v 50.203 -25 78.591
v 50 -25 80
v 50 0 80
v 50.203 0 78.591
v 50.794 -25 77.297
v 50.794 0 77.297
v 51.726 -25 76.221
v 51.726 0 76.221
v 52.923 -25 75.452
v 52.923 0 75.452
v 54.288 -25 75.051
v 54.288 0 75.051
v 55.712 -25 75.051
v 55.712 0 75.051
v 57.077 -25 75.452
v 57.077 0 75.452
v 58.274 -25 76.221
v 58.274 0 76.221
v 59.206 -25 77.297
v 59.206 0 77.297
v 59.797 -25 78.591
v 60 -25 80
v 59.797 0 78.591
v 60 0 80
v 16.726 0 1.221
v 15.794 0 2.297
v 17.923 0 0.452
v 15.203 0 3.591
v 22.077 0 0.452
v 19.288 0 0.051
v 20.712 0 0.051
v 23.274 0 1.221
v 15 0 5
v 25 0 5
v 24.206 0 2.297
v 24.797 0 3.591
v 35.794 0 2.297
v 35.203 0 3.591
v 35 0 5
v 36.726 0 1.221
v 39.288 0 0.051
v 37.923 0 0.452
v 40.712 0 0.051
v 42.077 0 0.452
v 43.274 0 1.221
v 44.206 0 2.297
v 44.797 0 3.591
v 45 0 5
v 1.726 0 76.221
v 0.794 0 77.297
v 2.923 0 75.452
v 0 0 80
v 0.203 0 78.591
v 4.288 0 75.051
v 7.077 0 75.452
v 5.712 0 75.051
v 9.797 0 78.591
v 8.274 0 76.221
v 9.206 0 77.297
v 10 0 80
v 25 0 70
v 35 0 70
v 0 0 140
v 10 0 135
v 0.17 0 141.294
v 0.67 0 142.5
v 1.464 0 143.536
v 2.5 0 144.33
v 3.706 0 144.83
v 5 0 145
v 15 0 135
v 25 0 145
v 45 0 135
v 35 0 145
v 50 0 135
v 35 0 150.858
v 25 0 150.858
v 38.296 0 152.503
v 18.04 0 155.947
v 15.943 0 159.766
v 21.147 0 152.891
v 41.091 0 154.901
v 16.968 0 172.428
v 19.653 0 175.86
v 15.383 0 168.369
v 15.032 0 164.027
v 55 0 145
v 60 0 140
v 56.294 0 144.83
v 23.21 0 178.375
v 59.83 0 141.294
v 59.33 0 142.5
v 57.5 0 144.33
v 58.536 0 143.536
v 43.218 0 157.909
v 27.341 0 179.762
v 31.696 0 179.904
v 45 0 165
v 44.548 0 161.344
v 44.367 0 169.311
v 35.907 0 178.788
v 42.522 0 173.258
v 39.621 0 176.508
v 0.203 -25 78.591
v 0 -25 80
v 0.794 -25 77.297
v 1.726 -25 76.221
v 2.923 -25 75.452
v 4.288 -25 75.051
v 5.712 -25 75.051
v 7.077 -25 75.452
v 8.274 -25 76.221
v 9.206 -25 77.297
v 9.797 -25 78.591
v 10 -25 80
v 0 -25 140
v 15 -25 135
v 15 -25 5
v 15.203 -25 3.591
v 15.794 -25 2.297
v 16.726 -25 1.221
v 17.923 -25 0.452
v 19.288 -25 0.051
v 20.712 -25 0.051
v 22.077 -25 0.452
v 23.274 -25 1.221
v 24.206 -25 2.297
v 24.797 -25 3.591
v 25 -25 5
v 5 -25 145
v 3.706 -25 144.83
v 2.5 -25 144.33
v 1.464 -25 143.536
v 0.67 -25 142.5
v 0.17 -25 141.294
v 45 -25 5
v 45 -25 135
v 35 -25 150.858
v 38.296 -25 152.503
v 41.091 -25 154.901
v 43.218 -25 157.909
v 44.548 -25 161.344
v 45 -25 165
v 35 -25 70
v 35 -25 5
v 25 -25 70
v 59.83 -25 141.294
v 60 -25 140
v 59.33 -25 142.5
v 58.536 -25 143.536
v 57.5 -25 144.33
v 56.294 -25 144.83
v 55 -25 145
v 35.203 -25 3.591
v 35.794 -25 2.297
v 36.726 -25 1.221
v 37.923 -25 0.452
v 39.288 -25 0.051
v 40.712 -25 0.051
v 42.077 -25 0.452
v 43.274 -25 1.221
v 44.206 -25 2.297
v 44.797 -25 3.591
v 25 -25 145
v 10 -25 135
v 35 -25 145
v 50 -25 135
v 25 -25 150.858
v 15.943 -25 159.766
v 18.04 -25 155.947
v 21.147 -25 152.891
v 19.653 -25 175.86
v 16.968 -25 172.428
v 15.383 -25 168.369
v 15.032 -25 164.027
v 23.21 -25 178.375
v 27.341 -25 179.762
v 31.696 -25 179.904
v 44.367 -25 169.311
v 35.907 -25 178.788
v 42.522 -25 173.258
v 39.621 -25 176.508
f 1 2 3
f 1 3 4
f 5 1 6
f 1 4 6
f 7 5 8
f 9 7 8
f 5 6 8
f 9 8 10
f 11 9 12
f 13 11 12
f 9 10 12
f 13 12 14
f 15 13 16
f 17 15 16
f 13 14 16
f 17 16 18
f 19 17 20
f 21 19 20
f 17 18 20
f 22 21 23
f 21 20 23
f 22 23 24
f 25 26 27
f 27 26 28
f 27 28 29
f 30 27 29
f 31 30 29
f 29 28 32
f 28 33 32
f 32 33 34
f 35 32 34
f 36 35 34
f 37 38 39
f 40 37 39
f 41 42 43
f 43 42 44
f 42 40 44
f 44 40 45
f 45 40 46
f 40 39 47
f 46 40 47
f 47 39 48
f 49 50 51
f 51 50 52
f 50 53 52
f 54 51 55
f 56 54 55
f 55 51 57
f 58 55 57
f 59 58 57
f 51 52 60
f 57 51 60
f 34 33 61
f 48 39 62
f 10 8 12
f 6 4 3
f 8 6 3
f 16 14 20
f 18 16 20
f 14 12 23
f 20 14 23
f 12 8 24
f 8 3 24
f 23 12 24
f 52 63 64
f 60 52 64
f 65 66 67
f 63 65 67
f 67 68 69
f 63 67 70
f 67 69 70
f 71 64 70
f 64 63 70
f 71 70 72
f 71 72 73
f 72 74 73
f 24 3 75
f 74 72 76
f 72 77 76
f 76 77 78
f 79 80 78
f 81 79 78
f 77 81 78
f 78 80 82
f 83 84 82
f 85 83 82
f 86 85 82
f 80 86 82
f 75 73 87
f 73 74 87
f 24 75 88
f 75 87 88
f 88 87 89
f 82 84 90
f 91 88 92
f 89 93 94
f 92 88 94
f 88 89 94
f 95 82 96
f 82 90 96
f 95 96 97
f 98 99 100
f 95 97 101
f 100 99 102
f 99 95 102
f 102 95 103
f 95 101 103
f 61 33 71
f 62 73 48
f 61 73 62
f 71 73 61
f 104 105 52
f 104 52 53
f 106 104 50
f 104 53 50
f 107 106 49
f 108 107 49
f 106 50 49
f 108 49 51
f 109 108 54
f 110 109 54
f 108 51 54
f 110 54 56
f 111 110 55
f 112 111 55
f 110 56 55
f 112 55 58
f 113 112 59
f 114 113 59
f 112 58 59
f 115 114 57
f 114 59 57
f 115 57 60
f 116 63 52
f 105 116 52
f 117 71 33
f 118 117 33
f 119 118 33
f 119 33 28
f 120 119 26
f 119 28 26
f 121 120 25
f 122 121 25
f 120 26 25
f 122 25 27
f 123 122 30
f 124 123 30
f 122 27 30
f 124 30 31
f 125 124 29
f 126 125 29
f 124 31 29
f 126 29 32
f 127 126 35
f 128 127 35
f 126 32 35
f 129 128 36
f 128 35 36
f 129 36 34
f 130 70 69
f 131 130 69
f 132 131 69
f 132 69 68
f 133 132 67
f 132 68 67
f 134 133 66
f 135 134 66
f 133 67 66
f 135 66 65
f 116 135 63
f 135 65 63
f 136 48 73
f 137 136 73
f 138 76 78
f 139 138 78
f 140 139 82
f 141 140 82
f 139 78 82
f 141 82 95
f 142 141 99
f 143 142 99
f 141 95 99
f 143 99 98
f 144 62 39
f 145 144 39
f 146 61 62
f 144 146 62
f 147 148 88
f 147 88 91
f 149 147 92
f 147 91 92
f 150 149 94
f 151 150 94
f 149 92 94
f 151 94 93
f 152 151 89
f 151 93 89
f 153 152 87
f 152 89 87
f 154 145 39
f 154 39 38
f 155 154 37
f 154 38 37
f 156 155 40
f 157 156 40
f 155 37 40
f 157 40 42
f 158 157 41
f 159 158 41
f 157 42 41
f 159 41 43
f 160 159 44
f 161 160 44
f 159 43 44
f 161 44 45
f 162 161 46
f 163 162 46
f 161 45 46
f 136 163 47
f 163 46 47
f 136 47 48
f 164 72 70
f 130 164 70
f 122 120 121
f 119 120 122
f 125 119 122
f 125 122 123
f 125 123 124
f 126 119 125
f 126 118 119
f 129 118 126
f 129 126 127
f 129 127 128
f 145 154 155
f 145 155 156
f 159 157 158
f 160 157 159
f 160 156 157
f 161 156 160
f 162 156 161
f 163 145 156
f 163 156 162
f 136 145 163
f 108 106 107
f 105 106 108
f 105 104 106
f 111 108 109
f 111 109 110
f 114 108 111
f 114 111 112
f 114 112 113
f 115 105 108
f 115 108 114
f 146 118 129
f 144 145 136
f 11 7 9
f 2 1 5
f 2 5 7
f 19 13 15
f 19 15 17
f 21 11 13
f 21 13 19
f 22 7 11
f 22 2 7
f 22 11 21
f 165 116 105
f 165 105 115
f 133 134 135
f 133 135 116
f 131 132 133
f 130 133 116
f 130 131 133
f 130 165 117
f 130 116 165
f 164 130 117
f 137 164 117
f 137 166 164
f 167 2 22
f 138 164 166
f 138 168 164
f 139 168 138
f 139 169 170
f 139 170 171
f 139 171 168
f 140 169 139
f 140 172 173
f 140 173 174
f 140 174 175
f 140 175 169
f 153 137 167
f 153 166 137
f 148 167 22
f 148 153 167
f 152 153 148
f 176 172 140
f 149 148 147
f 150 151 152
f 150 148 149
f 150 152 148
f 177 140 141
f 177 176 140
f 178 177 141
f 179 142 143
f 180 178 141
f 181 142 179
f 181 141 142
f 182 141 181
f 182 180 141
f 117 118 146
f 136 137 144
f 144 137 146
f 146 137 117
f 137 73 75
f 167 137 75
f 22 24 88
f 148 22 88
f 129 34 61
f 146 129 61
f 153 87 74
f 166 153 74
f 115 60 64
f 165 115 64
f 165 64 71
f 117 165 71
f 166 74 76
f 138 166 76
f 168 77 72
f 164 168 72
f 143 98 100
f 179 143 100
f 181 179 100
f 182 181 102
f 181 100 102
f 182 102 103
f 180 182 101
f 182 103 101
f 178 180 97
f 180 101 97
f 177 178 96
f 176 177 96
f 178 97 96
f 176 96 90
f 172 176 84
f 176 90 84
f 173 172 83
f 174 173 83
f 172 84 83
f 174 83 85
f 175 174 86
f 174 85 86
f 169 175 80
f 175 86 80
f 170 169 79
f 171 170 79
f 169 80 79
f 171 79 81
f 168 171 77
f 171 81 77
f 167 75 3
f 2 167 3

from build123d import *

# Parameters (mm, degrees)
F0_W     = 5
F0_H     = 5
F1_DEPTH = 25


with BuildPart() as f1:
    # F0 (on Front) → F1 (new body)
    with BuildSketch(Plane.XZ):
        with BuildLine():
            ThreePointArc((35, 150.8578643763), (42.2474487139, 156.3397459622), (45, 165))
            ThreePointArc((45, 165), (21.3397459622, 177.2474487139), (25, 150.8578643763))
            ThreePointArc((25, 150.8578643763), (27.4634703191, 150.2160216052), (30, 150))
            ThreePointArc((30, 150), (32.5365296809, 150.2160216052), (35, 150.8578643763))
        make_face()
        with BuildLine():
            ThreePointArc((30, 150), (27.4634703191, 150.2160216052), (25, 150.8578643763))
            Line((25, 150.8578643763), (25, 145))
            Line((25, 145), (30, 145))
            Line((30, 145), (30, 150))
        make_face()
        with BuildLine():
            Line((35, 145), (35, 150.8578643763))
            ThreePointArc((35, 150.8578643763), (32.5365296809, 150.2160216052), (30, 150))
            Line((30, 150), (30, 145))
            Line((30, 145), (35, 145))
        make_face()
        with BuildLine():
            Line((25, 140), (25, 145))
            Line((25, 145), (5, 145))
            ThreePointArc((5, 145), (8.5355339059, 143.5355339059), (10, 140))
            Line((10, 140), (25, 140))
        make_face()
        with BuildLine():
            Line((30, 145), (25, 145))
            Line((25, 145), (25, 140))
            ThreePointArc((25, 140), (26.4644660941, 143.5355339059), (30, 145))
        make_face()
        with BuildLine():
            Line((35, 140), (35, 145))
            Line((35, 145), (30, 145))
            ThreePointArc((30, 145), (33.5355339059, 143.5355339059), (35, 140))
        make_face()
        with BuildLine():
            Line((55, 145), (35, 145))
            Line((35, 145), (35, 140))
            Line((35, 140), (50, 140))
            ThreePointArc((50, 140), (51.4644660941, 143.5355339059), (55, 145))
        make_face()
        with BuildLine():
            ThreePointArc((10, 140), (8.5355339059, 143.5355339059), (5, 145))
            ThreePointArc((5, 145), (1.4644660941, 143.5355339059), (0, 140))
            ThreePointArc((0, 140), (1.4644660941, 136.4644660941), (5, 135))
            Line((5, 135), (5, 140))
            Line((5, 140), (10, 140))
        make_face()
        with BuildLine():
            ThreePointArc((30, 135), (26.4644660941, 136.4644660941), (25, 140))
            Line((25, 140), (10, 140))
            Line((10, 140), (10, 135))
            Line((10, 135), (15, 135))
            Line((15, 135), (30, 135))
        make_face()
        with BuildLine():
            ThreePointArc((60, 140), (58.5355339059, 143.5355339059), (55, 145))
            ThreePointArc((55, 145), (51.4644660941, 143.5355339059), (50, 140))
            Line((50, 140), (55, 140))
            Line((55, 140), (55, 135))
            ThreePointArc((55, 135), (58.5355339059, 136.4644660941), (60, 140))
        make_face()
        with BuildLine():
            Line((50, 140), (35, 140))
            ThreePointArc((35, 140), (33.5355339059, 136.4644660941), (30, 135))
            Line((30, 135), (45, 135))
            Line((45, 135), (50, 135))
            Line((50, 135), (50, 140))
        make_face()
        with BuildLine():
            ThreePointArc((5, 135), (1.4644660941, 136.4644660941), (0, 140))
            Line((0, 140), (0, 80))
            ThreePointArc((0, 80), (5, 75), (10, 80))
            Line((10, 80), (10, 135))
            Line((10, 135), (5, 135))
        make_face()
        with Locations((7.5, 137.5)):
            Rectangle(F0_W, F0_H)
        with BuildLine():
            Line((45, 135), (30, 135))
            Line((30, 135), (30, 75))
            Line((30, 75), (35, 75))
            ThreePointArc((35, 75), (40, 80), (45, 75))
            Line((45, 75), (45, 135))
        make_face()
        with BuildLine():
            Line((30, 75), (30, 135))
            Line((30, 135), (15, 135))
            Line((15, 135), (15, 75))
            ThreePointArc((15, 75), (20, 80), (25, 75))
            Line((25, 75), (30, 75))
        make_face()
        with BuildLine():
            Line((60, 80), (60, 140))
            ThreePointArc((60, 140), (58.5355339059, 136.4644660941), (55, 135))
            Line((55, 135), (50, 135))
            Line((50, 135), (50, 80))
            ThreePointArc((50, 80), (55, 75), (60, 80))
        make_face()
        with Locations((52.5, 137.5)):
            Rectangle(F0_W, F0_H)
        Polygon((35, 75), (30, 75), (25, 75), (25, 70), (30, 70), (35, 70), align=None)
        with BuildLine():
            Line((25, 70), (25, 75))
            ThreePointArc((25, 75), (20, 80), (15, 75))
            Line((15, 75), (15, 5))
            ThreePointArc((15, 5), (20, 0), (25, 5))
            Line((25, 5), (25, 70))
        make_face()
        with BuildLine():
            ThreePointArc((45, 75), (40, 80), (35, 75))
            Line((35, 75), (35, 70))
            Line((35, 70), (35, 5))
            ThreePointArc((35, 5), (40, 0), (45, 5))
            Line((45, 5), (45, 75))
        make_face()
        with BuildLine():
            ThreePointArc((35, 140), (33.5355339059, 143.5355339059), (30, 145))
            Line((30, 145), (30, 140))
            Line((30, 140), (35, 140))
        make_face()
        with BuildLine():
            Line((30, 140), (30, 145))
            ThreePointArc((30, 145), (26.4644660941, 143.5355339059), (25, 140))
            Line((25, 140), (30, 140))
        make_face()
        with BuildLine():
            Line((30, 140), (25, 140))
            ThreePointArc((25, 140), (26.4644660941, 136.4644660941), (30, 135))
            Line((30, 135), (30, 140))
        make_face()
        with BuildLine():
            ThreePointArc((30, 135), (33.5355339059, 136.4644660941), (35, 140))
            Line((35, 140), (30, 140))
            Line((30, 140), (30, 135))
        make_face()
    extrude(amount=F1_DEPTH)


solid = f1.part
